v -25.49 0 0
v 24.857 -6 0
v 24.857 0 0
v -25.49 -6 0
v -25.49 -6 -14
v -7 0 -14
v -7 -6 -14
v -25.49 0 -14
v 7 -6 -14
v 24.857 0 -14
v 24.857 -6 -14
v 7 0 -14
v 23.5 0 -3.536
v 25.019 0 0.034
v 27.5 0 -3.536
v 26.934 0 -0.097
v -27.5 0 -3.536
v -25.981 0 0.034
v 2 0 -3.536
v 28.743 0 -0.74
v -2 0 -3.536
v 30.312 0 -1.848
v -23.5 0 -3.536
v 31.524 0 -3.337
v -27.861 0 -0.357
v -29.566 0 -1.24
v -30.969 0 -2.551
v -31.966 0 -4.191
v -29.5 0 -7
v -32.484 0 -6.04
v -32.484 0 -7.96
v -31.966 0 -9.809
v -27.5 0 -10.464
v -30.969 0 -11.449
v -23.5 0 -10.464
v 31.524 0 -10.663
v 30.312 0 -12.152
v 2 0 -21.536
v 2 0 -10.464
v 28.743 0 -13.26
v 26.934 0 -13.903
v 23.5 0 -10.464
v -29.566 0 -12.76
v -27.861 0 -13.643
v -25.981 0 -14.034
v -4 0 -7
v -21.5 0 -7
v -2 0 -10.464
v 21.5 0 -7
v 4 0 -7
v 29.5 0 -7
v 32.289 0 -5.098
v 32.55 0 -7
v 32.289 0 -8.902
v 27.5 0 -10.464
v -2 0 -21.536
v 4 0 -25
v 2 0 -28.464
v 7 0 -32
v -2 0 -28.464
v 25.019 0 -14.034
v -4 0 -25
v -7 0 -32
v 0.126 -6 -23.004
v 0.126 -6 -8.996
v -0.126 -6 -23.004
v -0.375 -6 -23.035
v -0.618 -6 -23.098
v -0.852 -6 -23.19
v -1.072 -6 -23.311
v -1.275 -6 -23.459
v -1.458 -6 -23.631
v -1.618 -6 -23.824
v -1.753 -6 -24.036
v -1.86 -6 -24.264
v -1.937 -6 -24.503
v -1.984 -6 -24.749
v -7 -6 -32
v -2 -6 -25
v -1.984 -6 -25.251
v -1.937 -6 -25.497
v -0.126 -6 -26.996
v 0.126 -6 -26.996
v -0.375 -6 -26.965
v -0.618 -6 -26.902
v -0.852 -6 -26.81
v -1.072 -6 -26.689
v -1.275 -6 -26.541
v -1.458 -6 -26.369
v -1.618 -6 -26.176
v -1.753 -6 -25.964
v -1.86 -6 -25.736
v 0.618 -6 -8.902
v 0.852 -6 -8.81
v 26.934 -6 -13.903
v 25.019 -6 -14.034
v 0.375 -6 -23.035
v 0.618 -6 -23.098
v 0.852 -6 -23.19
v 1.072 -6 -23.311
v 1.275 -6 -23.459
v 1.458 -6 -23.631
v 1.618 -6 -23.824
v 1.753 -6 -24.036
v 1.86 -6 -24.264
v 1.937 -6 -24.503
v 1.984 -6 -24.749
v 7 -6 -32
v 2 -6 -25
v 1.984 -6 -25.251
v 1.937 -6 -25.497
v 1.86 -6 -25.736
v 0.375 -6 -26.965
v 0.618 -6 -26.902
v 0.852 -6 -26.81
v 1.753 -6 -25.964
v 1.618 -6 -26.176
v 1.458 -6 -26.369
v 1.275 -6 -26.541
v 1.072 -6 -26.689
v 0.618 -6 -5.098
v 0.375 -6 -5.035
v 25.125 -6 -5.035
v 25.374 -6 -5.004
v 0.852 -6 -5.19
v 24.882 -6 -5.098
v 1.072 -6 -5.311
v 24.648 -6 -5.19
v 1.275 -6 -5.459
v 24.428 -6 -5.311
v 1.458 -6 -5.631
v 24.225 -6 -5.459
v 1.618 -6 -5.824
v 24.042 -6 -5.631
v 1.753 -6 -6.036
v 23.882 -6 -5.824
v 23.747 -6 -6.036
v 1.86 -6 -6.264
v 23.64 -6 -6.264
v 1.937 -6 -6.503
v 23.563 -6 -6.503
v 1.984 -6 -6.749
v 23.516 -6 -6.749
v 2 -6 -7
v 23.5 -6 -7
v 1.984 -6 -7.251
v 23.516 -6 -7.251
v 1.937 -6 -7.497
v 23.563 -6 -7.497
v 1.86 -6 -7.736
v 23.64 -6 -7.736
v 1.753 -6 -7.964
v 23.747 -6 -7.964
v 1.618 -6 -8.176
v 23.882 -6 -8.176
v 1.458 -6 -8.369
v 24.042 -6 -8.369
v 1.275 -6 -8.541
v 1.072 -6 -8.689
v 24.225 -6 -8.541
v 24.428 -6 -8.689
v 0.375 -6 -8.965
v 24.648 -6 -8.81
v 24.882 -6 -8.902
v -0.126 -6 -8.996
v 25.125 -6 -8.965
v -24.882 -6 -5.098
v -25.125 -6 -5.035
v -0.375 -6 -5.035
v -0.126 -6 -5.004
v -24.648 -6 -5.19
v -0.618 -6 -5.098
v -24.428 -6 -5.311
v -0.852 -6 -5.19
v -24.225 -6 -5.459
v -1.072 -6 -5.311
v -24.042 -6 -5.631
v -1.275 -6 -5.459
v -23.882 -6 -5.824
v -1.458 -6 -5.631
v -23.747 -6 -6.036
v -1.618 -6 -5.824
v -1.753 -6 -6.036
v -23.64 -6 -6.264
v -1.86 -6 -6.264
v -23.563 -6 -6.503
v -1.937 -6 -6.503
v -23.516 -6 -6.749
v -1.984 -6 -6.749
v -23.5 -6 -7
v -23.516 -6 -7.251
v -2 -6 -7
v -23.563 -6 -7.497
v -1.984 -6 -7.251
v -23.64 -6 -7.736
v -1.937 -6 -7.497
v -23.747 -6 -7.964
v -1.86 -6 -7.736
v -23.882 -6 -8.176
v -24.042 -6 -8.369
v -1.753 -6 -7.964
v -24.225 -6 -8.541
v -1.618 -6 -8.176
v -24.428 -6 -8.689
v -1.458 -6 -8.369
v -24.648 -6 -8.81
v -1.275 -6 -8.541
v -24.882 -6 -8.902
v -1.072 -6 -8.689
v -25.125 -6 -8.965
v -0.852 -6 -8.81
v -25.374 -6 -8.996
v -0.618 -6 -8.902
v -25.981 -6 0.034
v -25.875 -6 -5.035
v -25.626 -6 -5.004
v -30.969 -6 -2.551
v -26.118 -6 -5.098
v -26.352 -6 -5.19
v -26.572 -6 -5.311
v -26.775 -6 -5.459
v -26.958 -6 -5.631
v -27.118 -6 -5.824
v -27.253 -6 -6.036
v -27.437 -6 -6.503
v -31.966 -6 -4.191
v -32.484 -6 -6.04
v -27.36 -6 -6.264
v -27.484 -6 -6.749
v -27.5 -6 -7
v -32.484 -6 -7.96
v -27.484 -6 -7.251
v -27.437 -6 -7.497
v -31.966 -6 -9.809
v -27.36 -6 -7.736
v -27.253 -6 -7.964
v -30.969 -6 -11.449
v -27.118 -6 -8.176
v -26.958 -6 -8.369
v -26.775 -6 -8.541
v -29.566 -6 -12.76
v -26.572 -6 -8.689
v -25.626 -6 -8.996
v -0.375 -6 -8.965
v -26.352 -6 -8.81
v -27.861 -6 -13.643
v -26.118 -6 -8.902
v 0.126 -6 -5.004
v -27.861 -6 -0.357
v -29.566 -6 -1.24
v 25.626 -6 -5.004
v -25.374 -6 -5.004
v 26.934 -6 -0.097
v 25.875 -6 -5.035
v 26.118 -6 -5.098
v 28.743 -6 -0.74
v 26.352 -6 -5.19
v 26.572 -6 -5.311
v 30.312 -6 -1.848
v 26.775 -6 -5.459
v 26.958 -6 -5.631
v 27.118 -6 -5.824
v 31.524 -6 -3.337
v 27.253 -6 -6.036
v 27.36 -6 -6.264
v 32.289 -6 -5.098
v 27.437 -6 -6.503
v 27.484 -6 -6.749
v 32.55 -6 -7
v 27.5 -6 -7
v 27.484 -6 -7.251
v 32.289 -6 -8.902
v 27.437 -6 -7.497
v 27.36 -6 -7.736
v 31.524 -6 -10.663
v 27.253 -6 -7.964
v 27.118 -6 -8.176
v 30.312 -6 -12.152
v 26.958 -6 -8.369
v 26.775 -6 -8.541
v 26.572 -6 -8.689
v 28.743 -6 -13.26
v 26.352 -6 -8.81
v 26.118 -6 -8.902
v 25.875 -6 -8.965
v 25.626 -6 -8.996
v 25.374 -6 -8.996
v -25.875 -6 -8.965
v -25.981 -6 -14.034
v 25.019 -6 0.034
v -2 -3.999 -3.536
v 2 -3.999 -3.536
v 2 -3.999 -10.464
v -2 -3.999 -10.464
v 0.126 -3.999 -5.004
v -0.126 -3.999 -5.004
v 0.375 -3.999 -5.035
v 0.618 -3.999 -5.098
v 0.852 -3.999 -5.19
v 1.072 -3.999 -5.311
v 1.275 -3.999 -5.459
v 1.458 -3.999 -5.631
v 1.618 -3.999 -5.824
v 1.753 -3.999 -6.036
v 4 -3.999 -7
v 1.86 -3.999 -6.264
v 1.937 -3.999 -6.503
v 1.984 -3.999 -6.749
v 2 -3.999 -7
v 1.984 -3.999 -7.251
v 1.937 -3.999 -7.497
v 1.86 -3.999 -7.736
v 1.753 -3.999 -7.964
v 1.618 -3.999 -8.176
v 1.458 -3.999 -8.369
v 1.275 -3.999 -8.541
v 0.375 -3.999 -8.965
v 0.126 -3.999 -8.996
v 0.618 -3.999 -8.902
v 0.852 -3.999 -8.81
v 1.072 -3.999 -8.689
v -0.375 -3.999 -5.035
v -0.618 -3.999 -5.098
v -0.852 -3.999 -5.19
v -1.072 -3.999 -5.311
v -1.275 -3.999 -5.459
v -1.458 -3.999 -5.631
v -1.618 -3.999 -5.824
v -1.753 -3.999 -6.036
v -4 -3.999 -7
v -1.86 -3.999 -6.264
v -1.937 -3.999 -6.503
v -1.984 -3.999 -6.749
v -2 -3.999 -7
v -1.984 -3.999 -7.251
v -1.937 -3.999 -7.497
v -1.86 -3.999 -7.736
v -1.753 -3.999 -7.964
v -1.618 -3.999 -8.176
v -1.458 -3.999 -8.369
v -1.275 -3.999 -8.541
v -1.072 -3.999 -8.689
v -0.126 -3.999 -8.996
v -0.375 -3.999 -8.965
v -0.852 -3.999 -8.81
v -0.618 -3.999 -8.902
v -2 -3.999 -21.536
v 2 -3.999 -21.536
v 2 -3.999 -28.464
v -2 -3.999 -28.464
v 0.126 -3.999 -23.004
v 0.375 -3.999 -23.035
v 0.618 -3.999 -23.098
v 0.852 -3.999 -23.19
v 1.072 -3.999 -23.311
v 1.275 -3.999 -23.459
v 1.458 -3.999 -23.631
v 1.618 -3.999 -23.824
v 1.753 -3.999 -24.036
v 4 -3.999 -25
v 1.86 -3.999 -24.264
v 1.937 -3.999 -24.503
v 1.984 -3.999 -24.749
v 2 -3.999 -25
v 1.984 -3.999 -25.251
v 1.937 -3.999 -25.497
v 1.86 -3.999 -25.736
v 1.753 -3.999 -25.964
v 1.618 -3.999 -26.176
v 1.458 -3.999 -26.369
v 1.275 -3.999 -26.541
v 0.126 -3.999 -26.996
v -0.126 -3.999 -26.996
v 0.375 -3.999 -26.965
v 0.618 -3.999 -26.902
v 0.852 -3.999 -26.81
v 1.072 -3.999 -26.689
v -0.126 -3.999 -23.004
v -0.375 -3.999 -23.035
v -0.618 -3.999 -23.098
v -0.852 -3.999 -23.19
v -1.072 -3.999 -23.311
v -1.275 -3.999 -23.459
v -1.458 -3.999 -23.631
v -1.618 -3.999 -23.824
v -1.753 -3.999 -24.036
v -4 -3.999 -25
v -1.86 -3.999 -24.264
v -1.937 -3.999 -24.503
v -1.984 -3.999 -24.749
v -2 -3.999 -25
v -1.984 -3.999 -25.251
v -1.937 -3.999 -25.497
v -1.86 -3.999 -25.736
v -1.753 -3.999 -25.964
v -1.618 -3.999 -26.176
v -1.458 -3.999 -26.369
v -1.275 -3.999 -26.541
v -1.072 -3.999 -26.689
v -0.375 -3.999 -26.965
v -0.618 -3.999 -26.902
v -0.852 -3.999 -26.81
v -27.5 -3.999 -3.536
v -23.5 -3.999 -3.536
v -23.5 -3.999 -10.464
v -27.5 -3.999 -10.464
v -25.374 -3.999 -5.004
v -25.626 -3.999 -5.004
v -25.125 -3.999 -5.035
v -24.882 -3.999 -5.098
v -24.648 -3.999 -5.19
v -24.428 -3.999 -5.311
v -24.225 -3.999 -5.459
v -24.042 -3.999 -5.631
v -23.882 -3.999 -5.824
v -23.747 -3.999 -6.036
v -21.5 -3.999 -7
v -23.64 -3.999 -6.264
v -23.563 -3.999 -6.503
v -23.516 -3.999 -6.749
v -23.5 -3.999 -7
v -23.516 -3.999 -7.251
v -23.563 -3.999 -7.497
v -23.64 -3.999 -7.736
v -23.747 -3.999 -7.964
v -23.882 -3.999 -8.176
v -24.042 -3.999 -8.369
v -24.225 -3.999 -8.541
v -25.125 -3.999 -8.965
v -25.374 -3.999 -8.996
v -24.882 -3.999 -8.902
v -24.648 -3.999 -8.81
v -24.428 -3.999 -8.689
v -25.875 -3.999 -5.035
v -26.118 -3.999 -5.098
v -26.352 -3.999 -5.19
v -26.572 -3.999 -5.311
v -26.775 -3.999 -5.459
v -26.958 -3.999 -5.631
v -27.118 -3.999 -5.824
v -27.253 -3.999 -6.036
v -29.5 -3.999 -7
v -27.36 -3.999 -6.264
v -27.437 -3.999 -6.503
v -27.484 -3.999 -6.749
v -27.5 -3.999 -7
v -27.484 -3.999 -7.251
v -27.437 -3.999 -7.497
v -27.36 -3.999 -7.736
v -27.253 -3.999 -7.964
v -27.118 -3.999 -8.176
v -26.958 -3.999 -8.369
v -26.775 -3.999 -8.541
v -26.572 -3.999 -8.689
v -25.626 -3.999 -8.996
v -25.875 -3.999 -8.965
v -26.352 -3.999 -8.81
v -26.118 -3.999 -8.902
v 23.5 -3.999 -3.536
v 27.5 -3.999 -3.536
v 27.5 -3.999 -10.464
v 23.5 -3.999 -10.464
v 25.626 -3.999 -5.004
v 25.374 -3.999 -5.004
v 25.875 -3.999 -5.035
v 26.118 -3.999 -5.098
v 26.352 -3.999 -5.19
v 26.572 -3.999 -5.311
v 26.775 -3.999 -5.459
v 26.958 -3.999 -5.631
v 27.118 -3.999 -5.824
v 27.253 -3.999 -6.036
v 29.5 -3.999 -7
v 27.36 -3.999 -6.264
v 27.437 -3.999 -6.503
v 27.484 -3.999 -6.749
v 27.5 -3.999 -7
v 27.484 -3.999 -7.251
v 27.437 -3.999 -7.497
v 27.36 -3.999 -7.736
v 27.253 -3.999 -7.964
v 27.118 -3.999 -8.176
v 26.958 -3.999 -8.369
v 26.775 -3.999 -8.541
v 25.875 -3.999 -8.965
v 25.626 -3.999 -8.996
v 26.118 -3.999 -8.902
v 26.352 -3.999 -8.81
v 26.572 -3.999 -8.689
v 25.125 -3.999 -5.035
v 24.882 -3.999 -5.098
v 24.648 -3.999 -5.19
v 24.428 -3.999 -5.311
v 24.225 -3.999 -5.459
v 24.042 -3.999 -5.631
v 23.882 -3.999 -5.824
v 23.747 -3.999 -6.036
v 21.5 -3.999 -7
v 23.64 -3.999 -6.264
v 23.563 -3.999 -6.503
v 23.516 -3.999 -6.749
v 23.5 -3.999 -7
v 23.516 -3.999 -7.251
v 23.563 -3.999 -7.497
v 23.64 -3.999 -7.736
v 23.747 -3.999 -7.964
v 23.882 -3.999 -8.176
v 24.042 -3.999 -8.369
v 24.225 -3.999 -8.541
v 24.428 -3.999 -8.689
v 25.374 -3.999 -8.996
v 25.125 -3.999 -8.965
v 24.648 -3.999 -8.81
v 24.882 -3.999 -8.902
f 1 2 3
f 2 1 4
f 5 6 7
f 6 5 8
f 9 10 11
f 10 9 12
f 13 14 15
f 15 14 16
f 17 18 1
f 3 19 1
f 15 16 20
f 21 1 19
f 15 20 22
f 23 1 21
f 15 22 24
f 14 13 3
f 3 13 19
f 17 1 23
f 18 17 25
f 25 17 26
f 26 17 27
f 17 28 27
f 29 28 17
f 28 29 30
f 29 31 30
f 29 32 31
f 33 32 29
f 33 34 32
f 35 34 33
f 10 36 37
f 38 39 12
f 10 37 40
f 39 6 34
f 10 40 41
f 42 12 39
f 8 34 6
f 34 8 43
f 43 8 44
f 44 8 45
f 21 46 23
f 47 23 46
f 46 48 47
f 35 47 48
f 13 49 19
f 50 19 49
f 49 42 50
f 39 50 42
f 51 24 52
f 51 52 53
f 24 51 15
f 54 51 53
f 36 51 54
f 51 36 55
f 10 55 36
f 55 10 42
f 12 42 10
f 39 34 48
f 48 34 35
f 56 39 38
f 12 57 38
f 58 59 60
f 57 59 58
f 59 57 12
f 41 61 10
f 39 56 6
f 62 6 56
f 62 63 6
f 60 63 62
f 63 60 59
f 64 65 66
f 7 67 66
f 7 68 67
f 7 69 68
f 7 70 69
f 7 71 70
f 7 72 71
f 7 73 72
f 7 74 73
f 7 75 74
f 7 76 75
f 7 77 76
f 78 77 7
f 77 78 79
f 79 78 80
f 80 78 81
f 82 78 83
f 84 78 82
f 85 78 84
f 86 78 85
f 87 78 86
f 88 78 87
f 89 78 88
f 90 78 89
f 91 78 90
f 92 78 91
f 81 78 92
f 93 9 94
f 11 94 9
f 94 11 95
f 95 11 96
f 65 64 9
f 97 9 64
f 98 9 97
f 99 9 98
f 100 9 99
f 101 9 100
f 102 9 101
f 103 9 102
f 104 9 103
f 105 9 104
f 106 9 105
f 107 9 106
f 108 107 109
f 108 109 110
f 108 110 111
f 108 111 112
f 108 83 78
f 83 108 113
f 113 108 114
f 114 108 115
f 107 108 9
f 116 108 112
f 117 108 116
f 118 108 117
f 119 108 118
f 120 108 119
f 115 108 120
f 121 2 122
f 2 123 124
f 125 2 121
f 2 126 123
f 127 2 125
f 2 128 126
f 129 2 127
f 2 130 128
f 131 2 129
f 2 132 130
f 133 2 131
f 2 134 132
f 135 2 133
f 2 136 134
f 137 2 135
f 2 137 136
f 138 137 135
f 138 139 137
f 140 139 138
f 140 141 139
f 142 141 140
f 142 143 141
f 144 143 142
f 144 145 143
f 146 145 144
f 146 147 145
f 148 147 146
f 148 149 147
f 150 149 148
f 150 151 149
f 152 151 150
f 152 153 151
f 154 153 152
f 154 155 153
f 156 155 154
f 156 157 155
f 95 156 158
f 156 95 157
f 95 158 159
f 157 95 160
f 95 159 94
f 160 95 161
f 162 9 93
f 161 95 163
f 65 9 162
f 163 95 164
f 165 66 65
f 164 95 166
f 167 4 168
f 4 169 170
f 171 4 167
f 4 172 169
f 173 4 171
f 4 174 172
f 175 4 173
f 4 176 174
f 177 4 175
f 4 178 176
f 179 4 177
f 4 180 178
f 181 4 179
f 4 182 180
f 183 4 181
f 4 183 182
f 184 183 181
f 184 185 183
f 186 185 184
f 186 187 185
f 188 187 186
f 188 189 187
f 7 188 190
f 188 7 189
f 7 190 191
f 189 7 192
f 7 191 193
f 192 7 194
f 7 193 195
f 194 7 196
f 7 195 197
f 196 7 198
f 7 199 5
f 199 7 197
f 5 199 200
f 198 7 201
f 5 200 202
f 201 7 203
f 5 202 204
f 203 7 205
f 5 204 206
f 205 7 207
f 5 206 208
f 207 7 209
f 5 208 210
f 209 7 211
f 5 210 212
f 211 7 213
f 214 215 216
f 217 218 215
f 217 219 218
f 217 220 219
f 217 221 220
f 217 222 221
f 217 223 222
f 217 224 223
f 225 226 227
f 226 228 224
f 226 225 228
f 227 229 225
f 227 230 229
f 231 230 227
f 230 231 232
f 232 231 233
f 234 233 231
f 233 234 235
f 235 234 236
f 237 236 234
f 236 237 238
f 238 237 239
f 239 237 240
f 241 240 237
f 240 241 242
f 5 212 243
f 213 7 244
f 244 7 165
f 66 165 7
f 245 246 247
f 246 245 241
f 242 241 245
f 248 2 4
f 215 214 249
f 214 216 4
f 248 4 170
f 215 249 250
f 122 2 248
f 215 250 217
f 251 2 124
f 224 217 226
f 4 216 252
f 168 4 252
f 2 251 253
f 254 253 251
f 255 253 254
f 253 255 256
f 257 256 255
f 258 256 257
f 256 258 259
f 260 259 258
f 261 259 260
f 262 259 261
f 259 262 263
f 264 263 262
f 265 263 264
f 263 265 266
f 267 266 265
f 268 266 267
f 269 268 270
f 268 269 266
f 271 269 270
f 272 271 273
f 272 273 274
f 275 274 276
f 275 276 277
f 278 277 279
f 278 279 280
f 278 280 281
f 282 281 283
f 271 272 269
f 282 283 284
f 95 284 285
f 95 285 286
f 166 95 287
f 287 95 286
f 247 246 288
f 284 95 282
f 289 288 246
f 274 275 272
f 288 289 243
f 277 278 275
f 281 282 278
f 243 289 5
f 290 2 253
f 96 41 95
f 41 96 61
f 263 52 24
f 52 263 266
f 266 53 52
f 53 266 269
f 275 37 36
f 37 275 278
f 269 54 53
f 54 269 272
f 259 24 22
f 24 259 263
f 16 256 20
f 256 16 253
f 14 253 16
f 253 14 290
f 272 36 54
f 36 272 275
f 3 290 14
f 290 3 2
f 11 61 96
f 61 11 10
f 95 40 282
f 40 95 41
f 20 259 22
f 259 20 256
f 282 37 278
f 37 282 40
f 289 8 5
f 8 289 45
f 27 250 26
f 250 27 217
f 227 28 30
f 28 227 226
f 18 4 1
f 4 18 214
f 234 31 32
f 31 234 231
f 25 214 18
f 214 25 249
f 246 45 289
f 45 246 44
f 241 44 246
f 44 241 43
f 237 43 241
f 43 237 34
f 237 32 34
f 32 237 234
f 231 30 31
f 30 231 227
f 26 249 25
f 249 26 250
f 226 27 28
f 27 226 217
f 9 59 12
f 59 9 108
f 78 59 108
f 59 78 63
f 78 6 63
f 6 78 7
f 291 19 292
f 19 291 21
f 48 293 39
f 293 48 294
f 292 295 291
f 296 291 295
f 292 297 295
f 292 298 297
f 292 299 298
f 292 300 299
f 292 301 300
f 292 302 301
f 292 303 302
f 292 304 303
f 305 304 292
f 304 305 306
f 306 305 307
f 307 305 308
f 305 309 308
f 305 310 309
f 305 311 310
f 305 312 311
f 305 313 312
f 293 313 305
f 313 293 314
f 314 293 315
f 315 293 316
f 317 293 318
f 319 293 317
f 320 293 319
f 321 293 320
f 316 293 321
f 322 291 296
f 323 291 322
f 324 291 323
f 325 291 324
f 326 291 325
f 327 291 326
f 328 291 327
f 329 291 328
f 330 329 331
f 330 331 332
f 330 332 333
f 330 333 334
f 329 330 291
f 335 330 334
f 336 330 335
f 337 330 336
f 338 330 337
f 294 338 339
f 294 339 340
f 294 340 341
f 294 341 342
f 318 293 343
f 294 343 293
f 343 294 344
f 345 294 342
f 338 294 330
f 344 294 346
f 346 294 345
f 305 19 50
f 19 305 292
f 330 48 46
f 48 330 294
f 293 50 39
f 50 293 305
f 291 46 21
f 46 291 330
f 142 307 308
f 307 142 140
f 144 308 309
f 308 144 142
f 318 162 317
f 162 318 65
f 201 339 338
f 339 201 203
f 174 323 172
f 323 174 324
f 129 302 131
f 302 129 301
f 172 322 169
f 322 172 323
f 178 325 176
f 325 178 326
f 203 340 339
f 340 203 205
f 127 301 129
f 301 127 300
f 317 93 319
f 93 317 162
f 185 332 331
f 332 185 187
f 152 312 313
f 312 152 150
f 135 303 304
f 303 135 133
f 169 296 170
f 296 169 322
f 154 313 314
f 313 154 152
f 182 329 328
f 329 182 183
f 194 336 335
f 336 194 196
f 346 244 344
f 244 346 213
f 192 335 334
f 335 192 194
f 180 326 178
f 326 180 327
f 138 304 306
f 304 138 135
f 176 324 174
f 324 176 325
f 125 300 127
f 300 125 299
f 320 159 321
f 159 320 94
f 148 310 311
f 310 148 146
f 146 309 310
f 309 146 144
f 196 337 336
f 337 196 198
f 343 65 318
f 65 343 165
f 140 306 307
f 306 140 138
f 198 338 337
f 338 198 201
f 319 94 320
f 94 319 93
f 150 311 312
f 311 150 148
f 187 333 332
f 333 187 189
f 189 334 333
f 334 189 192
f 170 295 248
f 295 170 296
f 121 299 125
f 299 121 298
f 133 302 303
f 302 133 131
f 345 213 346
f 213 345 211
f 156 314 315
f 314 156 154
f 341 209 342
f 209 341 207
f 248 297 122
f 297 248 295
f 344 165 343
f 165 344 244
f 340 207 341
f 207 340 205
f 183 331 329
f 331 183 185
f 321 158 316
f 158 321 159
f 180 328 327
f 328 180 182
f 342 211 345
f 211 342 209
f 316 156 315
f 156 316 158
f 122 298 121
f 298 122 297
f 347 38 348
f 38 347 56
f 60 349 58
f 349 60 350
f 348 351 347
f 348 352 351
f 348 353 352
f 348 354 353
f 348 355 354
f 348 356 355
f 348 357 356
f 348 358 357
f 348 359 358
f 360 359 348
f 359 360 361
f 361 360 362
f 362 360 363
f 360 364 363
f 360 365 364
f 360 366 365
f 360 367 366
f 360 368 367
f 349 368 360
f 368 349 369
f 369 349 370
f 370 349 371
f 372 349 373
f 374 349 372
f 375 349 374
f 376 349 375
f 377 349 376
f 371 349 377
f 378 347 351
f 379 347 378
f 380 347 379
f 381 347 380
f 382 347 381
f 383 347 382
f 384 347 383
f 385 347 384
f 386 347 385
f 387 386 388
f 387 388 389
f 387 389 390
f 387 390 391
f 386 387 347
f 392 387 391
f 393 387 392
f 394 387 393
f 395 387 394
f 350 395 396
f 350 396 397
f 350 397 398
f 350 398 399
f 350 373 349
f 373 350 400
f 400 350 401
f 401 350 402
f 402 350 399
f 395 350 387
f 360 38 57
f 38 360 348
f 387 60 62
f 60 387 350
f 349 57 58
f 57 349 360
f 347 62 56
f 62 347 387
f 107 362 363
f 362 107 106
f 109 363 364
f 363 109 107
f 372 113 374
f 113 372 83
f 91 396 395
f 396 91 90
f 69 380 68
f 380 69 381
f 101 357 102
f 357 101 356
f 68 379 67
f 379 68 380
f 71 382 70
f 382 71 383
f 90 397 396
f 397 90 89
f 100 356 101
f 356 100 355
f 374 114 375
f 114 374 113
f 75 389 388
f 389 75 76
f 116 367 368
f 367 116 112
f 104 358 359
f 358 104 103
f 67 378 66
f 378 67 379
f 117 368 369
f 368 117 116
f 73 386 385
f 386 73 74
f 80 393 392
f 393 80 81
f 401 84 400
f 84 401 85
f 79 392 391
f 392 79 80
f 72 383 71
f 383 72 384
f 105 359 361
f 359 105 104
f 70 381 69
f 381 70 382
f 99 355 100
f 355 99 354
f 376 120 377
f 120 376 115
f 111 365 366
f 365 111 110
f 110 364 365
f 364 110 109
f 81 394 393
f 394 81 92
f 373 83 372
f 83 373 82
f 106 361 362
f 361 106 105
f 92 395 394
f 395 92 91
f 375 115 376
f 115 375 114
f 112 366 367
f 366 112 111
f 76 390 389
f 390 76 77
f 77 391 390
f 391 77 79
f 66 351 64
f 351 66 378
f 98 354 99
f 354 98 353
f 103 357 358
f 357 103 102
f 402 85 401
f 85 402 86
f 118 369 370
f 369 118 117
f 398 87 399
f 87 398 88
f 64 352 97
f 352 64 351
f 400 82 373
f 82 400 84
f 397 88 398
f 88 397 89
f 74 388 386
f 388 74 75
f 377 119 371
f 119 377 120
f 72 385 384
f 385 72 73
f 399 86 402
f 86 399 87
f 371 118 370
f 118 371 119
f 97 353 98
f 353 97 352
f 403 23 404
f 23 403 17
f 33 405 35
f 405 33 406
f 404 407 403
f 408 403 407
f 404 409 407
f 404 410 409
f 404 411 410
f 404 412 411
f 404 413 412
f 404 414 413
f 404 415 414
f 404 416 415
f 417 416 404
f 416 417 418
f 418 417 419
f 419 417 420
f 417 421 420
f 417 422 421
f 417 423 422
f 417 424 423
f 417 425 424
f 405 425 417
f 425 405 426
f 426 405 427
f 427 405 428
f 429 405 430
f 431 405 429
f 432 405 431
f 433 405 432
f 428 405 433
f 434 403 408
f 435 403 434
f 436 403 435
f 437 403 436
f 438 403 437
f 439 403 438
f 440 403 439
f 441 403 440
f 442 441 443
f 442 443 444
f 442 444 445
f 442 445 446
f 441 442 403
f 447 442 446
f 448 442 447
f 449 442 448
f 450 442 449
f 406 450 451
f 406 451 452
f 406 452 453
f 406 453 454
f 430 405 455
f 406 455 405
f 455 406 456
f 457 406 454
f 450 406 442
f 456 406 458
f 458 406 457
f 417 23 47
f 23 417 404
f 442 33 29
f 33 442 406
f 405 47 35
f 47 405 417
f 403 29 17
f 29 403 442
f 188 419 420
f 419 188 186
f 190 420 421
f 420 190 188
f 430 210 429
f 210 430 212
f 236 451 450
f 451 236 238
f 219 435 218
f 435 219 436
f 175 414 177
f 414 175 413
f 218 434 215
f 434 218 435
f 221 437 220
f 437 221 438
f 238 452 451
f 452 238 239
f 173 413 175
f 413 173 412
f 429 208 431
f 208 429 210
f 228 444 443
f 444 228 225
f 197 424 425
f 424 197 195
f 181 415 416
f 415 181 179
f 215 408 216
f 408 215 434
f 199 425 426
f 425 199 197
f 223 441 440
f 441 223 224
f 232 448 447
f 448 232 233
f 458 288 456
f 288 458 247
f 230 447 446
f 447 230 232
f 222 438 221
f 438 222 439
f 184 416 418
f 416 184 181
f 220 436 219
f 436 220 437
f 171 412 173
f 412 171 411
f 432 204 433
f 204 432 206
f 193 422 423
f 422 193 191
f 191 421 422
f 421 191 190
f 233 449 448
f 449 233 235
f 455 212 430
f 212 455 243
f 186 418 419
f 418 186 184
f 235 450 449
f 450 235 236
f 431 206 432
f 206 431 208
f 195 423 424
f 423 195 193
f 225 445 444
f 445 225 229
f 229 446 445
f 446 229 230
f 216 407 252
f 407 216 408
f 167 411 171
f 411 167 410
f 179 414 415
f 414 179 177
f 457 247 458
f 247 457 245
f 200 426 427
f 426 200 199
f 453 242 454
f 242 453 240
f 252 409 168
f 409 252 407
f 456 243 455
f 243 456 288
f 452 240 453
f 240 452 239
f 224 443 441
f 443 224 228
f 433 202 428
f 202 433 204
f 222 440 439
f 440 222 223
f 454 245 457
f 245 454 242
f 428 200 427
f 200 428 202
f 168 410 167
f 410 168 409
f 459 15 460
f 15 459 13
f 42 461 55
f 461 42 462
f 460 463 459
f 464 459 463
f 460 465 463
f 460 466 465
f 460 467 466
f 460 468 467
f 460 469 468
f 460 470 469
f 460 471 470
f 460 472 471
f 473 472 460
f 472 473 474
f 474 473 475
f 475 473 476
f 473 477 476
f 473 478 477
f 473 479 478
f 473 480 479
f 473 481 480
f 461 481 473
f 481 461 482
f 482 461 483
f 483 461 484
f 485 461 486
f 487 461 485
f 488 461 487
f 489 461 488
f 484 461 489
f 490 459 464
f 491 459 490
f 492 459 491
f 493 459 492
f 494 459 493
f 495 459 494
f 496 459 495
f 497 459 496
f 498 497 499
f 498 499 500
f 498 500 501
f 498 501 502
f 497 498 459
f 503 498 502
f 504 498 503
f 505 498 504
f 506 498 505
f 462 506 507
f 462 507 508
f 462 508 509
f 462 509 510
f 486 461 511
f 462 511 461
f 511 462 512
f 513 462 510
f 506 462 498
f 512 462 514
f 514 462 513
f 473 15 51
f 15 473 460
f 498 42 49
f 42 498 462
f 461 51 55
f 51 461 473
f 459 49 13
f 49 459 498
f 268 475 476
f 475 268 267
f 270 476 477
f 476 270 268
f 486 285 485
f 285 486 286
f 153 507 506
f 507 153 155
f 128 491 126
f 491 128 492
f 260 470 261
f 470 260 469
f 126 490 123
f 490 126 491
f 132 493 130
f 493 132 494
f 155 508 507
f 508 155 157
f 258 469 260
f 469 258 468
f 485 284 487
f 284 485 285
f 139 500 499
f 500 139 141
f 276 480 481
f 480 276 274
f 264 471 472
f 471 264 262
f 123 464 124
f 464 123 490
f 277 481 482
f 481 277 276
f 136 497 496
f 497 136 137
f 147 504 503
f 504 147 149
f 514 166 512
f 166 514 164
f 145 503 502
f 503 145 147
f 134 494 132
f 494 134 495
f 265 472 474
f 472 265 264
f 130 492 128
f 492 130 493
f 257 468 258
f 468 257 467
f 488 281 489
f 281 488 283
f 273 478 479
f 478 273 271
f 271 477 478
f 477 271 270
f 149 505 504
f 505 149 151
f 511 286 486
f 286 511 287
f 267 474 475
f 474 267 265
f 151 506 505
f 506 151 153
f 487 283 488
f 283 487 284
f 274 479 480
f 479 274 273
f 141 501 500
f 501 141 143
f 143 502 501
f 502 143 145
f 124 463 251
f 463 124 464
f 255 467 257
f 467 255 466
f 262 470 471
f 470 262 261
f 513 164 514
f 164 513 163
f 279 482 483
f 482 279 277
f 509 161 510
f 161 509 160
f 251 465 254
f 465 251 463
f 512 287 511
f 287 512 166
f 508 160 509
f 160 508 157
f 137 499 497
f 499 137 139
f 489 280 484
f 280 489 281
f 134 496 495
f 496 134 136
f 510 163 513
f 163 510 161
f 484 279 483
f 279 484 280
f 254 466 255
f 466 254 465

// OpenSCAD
/*
T shapped connector for rear bike racks
*/



/* [Rear Rack] */
// distance from center of center screw to center of any side screw
screw_center_horizontal = 25.5;
// distance from center of top screw to center of bottom screw
screw_center_vertical = 18;
// thickness of the part. must be larger than screw head depth as we will try to make screw flush
thickness = 6;
// radius of the screw head. i.e. half of the mm wrench you want to use
hex_head_radius = 4; //[1:12]
// depth of the screw head.
hex_head_depth = 4;
// margin from the screw to the edge of the part
hex_head_margin = 3;
// radius for hole for the screw body, obviously must be smaller than hex_head_radius
screw_hole_radius = 2;
// direction of the hex head (0=flat top, 30=pointy top)
hex_head_rotation = 0; // [0,30]
// how much the hex head hole should pierce trhu the holder part being attached (not usable on this part alone)
hex_head_pierce = 100;

/* [Hidden] */
Ttop_height = 2*hex_head_radius + 2*hex_head_margin;
Tver_height = screw_center_vertical + hex_head_radius+ hex_head_margin + Ttop_height/2;

module T() {
	translate([0,-thickness/2,-Ttop_height/2])
	union(){
		difference() {
			union(){
				// top of the T
				cube(center=true,[screw_center_horizontal*2, thickness, Ttop_height]);
				translate([screw_center_horizontal,0,0]) rotate(a=90,v=[1,0,0])
					cylinder(r=Ttop_height/2+0.05, h=thickness, center=true);
				translate([-screw_center_horizontal,0,0]) rotate(a=90,v=[1,0,0])
					cylinder(r=Ttop_height/2+0.05, h=thickness, center=true);
				// NOTE: the +0.05 on the cylinders above is to remove one artifact when it joing the body. without it, it looked like the radius was smaller than the height of the cube
				// vertical part of T
				translate([0,0,Ttop_height/2-Tver_height/2])
				cube(center=true,[Ttop_height, thickness, Tver_height]);
//translate([0,1,-5]) main();
			}
			// center hole, top
			translate([0,0,0])
				hex_head();
			// center hole, bottom
			translate([0,0,-screw_center_vertical])
				hex_head();
			// right ... yeah, our axis ended up a little off :)
			translate([-screw_center_horizontal,0,0])
				hex_head();
			// left
			translate([screw_center_horizontal,0,0])
				hex_head();
		}
	}
}

/** a sane way to create hexagons. fuck understanding polyhedron syntax at this hour of the night
*/
module hex_head(){
	// logic of this http://hexnet.org/content/hexagonal-geometry
	rotate( a=hex_head_rotation, v=[0,1,0])
	union(){
		translate([0,hex_head_pierce/2+thickness/2-hex_head_depth/2+0.001,0]){
			cube( size = [hex_head_radius,hex_head_pierce+ hex_head_depth+0.001, (hex_head_radius * sqrt(3))], center=true );
			rotate( a=60, v=[0,1,0])
				cube( size = [hex_head_radius, hex_head_pierce+hex_head_depth+0.001, (hex_head_radius * sqrt(3))], center=true );
			rotate( a=120, v=[0,1,0])
				cube( size = [hex_head_radius, hex_head_pierce+hex_head_depth+0.001, (hex_head_radius * sqrt(3))], center=true );
		}

		rotate(a=90,v=[1,0,0])
			translate([0,0,0])
				cylinder(r=screw_hole_radius, h=thickness+0.001+0.001+0.001+0.001, center=true, $fn=50);
				// NOTE: some reason the +0.001 was not working there... 0.004 did the trick, leaving syntax as 0.001 as i will find it with my regexps later
	}
}

T();
